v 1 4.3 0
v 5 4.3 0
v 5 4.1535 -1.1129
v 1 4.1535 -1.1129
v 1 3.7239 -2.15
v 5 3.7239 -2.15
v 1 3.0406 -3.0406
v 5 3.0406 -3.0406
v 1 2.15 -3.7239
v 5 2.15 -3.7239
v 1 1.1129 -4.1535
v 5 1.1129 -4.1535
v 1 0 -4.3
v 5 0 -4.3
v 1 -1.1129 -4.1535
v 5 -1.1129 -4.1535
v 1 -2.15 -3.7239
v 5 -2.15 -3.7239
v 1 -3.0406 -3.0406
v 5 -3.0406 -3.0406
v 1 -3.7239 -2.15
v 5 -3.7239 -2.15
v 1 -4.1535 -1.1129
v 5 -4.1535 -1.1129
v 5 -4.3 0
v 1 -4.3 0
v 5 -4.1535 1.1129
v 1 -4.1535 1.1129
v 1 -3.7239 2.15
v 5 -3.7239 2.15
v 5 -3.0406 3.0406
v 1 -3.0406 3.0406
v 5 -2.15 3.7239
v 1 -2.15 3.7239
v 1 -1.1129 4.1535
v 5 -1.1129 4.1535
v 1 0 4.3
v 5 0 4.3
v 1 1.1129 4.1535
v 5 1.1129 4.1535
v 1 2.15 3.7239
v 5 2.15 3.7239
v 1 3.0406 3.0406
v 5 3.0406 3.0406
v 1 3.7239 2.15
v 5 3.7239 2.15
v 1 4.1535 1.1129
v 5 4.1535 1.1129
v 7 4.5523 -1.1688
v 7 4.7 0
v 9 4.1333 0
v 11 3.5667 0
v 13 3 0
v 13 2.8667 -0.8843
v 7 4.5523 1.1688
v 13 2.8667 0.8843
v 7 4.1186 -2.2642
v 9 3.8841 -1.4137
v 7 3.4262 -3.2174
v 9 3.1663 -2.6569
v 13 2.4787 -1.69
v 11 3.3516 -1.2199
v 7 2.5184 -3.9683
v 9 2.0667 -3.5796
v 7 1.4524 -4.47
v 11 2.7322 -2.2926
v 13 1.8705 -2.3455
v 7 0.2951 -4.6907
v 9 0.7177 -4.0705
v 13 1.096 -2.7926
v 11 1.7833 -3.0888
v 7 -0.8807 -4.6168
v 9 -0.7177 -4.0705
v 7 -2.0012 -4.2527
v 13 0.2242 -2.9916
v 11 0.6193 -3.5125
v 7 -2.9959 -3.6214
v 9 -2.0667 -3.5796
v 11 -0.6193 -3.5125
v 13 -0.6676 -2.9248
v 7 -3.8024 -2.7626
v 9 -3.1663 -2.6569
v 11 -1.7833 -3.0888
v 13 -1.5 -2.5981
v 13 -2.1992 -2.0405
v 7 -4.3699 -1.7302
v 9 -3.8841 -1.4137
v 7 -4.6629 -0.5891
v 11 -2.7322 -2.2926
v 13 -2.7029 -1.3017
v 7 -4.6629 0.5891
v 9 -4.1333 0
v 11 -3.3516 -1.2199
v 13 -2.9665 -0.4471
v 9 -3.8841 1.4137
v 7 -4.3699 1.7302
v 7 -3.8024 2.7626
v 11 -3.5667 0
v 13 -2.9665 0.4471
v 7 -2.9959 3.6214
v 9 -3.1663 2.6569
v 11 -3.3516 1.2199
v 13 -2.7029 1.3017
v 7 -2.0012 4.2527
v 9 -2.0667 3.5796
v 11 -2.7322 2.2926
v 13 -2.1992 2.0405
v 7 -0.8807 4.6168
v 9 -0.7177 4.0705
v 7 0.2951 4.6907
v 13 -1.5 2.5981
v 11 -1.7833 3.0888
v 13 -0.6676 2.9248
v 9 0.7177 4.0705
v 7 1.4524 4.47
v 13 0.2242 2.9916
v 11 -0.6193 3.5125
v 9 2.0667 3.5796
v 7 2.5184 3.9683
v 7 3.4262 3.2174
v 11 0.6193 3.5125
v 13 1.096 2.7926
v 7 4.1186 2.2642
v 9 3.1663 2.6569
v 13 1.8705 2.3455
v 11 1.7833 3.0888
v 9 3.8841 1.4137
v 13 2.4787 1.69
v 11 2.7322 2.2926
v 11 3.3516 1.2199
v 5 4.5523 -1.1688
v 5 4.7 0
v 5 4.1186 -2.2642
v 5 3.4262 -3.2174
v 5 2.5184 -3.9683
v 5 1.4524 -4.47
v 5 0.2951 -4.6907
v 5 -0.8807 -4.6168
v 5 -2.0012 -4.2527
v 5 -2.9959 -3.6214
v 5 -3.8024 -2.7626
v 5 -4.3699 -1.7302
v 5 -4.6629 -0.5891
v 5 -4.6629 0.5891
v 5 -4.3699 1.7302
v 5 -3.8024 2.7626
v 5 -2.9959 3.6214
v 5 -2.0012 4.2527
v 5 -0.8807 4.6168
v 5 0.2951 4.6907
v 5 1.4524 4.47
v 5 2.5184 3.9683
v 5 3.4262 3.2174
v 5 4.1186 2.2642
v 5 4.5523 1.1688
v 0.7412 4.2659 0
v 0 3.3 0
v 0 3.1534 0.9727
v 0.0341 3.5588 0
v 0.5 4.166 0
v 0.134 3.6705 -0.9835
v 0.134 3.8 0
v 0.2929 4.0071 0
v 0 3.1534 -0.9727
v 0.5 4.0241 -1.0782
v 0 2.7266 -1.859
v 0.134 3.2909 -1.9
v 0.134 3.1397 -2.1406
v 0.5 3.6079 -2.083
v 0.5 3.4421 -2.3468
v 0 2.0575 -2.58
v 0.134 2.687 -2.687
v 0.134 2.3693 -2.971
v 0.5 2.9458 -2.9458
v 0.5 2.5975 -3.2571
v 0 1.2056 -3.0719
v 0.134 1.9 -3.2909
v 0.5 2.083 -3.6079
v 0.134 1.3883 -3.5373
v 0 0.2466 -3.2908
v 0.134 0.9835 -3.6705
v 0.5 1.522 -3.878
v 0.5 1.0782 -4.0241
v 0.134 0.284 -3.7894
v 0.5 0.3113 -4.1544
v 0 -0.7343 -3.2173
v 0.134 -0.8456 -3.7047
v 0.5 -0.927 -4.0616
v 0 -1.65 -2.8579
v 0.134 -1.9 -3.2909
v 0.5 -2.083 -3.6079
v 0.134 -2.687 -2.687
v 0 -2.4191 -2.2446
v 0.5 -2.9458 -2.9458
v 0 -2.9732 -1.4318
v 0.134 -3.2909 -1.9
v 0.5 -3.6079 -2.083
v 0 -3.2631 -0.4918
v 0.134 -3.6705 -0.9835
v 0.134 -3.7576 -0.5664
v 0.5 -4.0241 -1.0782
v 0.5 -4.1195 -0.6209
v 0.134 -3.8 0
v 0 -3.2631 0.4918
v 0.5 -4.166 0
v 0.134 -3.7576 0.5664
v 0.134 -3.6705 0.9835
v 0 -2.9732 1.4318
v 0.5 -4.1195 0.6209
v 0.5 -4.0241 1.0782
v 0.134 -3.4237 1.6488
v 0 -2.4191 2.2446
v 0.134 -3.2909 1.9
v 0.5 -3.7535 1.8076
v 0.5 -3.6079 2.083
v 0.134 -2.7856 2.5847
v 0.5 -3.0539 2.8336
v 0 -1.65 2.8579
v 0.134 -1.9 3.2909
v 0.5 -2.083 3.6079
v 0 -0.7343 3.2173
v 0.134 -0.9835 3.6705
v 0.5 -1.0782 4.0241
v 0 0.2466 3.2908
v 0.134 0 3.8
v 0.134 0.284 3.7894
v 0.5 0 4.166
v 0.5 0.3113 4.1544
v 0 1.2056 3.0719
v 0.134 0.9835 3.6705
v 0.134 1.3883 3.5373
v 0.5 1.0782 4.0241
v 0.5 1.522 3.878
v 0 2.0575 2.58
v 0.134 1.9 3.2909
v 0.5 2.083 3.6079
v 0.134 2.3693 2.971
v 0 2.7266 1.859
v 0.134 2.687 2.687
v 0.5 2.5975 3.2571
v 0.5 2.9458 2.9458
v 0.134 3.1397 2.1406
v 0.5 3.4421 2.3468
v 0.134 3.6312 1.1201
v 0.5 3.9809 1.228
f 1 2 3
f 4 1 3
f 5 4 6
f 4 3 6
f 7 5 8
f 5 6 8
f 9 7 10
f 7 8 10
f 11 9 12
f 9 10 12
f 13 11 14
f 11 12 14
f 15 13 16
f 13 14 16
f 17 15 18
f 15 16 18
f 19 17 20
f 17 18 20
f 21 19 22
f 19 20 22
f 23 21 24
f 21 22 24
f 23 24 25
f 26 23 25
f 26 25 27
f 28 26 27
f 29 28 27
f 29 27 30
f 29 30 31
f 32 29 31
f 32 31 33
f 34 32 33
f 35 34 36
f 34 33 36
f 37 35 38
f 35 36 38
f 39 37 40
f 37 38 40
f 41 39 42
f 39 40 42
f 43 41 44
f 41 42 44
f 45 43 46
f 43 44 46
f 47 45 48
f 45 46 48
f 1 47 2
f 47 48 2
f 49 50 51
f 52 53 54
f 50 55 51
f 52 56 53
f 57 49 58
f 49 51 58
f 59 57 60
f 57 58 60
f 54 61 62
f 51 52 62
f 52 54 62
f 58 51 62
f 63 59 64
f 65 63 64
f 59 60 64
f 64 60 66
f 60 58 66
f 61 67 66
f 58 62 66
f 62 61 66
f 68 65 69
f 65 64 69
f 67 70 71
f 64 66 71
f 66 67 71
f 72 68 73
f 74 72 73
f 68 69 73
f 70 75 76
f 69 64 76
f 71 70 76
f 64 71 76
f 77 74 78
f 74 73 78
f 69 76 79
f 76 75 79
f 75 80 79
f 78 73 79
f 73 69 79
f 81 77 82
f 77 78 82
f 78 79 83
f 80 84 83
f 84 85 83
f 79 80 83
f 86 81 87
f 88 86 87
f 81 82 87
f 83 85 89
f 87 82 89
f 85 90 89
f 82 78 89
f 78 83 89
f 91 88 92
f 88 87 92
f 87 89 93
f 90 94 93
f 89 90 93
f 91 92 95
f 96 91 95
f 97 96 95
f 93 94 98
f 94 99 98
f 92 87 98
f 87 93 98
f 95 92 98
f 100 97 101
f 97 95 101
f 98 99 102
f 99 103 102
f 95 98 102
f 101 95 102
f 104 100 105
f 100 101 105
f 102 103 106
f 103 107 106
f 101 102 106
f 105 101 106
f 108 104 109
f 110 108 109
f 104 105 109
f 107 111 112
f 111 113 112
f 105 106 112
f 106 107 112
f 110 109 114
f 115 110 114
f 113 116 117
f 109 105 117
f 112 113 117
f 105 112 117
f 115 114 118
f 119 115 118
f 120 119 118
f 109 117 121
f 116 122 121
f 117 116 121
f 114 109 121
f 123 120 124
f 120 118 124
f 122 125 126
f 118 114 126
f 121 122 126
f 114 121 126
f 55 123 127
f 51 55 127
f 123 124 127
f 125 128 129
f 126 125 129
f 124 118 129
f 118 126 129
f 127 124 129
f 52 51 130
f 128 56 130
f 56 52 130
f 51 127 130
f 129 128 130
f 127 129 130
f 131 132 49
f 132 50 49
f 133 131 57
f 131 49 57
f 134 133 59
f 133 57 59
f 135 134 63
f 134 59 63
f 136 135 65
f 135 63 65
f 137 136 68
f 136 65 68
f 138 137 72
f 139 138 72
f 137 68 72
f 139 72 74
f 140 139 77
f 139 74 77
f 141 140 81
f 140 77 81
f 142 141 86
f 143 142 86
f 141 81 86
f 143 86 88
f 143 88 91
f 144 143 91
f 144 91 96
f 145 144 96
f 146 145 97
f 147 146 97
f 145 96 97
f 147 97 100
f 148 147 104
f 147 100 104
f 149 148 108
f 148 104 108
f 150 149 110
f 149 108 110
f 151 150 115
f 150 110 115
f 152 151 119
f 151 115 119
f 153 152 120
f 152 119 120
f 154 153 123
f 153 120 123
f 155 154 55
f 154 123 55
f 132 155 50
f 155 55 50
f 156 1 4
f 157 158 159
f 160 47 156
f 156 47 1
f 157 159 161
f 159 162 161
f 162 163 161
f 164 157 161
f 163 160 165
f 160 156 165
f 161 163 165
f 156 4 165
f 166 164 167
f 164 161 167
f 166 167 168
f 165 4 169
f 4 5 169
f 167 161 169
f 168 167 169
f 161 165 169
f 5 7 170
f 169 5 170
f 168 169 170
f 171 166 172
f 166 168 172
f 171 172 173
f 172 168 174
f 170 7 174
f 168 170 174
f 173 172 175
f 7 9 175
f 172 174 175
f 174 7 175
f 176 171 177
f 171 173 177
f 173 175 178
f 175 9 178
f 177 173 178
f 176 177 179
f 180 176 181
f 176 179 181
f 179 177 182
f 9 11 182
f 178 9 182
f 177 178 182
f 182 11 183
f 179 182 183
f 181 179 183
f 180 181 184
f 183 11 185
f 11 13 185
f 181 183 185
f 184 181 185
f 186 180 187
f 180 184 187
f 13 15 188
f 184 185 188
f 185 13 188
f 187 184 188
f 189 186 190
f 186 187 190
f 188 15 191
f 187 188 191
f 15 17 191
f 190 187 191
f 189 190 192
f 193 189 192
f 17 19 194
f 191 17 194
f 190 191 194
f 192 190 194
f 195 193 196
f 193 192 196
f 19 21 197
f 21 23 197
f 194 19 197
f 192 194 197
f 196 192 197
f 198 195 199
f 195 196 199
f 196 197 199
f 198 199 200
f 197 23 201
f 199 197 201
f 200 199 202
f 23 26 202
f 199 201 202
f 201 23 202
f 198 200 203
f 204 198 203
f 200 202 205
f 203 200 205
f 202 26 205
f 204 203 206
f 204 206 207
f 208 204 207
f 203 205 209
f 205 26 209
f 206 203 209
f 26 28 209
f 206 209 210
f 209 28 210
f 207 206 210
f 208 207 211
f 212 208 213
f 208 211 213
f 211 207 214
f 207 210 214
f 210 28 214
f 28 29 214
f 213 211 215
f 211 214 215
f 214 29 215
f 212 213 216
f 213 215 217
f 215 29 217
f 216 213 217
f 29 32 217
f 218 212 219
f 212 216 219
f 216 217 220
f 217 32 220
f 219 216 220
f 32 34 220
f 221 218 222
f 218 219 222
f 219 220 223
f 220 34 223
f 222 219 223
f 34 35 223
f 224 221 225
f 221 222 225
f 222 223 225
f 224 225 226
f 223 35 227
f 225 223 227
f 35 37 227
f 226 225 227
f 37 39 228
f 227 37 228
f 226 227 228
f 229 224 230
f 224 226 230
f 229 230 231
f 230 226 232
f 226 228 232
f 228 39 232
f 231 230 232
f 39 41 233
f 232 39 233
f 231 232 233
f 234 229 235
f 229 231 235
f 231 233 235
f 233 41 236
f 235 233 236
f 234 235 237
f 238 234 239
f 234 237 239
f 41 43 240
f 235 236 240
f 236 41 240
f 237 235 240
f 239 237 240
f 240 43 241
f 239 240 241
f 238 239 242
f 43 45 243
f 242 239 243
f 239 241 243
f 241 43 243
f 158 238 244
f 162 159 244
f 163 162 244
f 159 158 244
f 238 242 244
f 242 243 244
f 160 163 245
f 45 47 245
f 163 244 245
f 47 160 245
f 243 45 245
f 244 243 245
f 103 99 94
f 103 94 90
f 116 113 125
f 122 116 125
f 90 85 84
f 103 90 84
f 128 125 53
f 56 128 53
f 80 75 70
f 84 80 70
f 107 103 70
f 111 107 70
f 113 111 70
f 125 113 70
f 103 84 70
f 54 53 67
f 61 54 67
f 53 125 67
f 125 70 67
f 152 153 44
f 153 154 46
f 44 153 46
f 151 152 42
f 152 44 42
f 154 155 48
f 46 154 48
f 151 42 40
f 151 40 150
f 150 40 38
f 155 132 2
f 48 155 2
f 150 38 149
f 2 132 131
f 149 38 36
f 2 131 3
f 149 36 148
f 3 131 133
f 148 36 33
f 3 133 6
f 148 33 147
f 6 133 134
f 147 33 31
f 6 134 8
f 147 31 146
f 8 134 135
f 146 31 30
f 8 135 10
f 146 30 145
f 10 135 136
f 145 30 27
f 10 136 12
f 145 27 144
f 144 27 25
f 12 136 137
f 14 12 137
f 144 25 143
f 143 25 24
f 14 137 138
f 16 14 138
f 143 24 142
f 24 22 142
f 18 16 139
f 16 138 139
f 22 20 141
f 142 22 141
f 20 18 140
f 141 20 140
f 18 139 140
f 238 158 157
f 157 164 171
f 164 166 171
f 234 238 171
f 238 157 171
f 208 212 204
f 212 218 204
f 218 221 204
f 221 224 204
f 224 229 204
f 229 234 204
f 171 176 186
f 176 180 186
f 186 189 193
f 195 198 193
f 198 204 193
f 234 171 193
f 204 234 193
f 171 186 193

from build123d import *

# Parameters (mm, degrees)
FILETE1_R = 1


with BuildPart() as part:
    # Esboço1 → Revolução1 (revolve)
    with BuildSketch(Plane.XY):
        Polygon((0, 0), (0, 4.3), (5, 4.3), (5, 4.7), (7, 4.7), (13, 3), (13, 0), align=None)
    revolve(axis=Axis((13, 0, 0), (-1, 0, 0)))

    # Filete1
    filete1_edges = [part.edges().sort_by_distance(p)[0] for p in [
        (0, -4.3, 0),
    ]]
    fillet(filete1_edges, radius=FILETE1_R)


solid = part.part
